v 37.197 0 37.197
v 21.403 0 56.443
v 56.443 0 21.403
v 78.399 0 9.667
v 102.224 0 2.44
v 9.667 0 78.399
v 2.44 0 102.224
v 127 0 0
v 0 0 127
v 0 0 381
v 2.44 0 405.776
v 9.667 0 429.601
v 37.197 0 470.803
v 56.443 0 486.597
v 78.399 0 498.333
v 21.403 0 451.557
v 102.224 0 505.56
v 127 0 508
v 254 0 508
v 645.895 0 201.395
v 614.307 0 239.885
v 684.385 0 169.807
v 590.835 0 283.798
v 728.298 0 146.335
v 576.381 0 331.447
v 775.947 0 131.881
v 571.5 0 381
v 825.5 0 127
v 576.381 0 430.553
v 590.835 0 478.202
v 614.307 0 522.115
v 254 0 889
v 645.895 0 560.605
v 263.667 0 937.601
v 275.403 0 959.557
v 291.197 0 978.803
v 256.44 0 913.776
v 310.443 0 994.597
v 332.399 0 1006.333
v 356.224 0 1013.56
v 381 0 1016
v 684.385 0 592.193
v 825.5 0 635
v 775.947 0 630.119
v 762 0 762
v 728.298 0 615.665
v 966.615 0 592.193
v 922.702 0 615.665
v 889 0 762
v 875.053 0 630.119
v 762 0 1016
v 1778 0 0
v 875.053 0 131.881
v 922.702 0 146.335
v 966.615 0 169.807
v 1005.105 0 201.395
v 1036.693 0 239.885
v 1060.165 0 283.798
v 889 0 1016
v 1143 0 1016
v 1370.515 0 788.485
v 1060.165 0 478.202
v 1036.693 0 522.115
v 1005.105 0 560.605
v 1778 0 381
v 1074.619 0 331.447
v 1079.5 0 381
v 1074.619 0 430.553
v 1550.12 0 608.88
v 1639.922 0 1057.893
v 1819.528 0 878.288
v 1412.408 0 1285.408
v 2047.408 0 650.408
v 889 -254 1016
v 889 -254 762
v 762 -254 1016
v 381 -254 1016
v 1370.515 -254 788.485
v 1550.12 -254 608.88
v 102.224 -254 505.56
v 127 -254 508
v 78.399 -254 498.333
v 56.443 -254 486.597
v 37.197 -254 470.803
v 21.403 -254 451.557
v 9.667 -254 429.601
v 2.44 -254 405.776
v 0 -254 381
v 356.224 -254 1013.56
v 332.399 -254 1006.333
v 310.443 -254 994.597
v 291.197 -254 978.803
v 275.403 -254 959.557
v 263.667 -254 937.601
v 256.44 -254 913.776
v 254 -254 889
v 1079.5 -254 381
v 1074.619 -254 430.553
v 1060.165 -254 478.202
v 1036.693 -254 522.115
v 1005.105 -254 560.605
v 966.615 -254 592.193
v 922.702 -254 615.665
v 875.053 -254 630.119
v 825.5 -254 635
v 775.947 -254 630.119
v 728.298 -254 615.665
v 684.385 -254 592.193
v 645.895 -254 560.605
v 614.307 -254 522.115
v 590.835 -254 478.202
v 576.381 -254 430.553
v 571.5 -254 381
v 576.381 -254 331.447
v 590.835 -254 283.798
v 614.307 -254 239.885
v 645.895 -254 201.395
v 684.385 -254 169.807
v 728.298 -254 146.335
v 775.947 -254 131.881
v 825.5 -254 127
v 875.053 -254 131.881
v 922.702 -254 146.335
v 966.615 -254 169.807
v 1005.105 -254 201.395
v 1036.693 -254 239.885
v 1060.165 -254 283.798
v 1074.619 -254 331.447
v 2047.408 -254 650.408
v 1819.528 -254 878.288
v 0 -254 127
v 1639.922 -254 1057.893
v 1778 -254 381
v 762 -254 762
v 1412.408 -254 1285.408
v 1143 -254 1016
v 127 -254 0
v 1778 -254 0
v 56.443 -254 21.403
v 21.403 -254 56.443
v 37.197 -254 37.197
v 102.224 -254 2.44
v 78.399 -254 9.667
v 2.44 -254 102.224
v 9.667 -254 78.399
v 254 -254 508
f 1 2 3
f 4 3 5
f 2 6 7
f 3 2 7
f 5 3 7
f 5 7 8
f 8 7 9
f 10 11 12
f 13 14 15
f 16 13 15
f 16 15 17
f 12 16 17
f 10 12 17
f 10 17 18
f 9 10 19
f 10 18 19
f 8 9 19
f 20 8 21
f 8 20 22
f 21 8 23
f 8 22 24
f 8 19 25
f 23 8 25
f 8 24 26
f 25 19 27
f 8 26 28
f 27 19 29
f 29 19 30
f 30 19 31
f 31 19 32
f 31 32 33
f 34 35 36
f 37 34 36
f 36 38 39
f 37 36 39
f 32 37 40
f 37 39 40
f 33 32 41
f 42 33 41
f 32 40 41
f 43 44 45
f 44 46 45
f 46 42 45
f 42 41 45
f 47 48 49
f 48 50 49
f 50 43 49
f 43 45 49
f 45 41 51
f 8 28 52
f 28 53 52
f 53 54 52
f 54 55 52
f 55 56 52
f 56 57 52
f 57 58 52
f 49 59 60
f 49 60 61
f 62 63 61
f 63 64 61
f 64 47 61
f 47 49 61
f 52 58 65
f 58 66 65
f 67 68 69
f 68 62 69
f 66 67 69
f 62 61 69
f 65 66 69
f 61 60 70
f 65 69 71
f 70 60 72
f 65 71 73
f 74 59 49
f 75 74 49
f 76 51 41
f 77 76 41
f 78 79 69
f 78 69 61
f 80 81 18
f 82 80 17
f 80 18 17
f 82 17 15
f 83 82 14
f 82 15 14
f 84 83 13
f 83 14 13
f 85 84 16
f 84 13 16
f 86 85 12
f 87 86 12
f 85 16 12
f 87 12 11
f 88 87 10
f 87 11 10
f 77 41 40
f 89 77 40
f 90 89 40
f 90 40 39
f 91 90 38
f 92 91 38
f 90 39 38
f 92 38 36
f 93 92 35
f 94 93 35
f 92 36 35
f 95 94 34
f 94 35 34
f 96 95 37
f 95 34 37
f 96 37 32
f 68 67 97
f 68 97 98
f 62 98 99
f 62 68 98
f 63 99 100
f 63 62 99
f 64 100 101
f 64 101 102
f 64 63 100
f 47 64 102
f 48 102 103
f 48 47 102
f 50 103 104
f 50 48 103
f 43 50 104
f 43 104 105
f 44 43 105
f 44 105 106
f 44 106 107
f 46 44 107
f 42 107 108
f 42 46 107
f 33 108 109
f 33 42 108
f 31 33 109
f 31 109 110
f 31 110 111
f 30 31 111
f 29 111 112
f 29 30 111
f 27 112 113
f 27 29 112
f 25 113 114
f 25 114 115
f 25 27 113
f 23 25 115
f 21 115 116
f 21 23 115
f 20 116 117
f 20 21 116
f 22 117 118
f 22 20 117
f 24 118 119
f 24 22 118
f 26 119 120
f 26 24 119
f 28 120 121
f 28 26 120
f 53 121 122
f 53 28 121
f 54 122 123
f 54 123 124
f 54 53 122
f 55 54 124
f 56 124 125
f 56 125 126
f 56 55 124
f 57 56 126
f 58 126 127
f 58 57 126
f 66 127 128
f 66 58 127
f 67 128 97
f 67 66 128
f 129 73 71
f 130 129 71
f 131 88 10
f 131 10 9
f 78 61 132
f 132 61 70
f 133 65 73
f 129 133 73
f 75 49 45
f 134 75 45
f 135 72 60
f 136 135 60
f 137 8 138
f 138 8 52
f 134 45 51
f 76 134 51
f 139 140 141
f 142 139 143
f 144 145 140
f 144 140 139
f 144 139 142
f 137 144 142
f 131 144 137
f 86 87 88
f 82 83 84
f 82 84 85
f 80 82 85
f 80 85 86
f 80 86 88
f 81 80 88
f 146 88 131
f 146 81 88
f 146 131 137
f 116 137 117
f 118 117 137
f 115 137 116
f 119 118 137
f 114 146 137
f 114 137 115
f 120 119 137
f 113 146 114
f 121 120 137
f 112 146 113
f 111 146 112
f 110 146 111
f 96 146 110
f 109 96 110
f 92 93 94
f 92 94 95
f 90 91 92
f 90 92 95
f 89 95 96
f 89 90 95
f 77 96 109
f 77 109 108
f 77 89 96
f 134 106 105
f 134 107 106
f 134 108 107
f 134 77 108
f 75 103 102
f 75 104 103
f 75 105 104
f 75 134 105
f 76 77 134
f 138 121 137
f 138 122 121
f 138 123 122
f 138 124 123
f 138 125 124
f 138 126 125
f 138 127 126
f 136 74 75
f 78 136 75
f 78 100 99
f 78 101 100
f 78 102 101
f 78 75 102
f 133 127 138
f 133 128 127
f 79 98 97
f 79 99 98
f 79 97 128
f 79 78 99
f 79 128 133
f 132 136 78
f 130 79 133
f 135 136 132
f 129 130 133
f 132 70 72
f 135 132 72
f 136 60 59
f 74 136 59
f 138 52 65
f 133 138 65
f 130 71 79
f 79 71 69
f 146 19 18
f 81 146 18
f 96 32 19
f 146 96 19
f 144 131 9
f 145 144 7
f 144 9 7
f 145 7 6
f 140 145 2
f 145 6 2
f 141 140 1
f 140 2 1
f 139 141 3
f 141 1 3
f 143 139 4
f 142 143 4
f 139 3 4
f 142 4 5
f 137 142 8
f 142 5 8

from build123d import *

# Parameters (mm, degrees)
F0_R     = 254
F1_DEPTH = 254


with BuildPart() as f1:
    # F0 (on Front) → F1 (new body)
    with BuildSketch(Plane.XZ):
        with BuildLine():
            Line((0, 381), (0, 127))
            ThreePointArc((0, 127), (37.197439, 37.197439), (127, 0))
            Line((127, 0), (1778, 0))
            Line((1778, 0), (1778, 381))
            Line((1778, 381), (2047.407684, 650.407684))
            Line((2047.407684, 650.407684), (1819.527595, 878.287772))
            Line((1819.527595, 878.287772), (1550.119911, 608.880089))
            Line((1550.119911, 608.880089), (1370.514789, 788.485211))
            Line((1370.514789, 788.485211), (1639.922472, 1057.892895))
            Line((1639.922472, 1057.892895), (1412.407684, 1285.407684))
            Line((1412.407684, 1285.407684), (1143, 1016))
            Line((1143, 1016), (889, 1016))
            Line((889, 1016), (889, 762))
            Line((889, 762), (762, 762))
            Line((762, 762), (762, 1016))
            Line((762, 1016), (381, 1016))
            ThreePointArc((381, 1016), (291.197439, 978.802561), (254, 889))
            Line((254, 889), (254, 508))
            Line((254, 508), (127, 508))
            ThreePointArc((127, 508), (37.197439, 470.802561), (0, 381))
        make_face()
        with Locations((825.5, 381)):
            Circle(F0_R, mode=Mode.SUBTRACT)
    extrude(amount=F1_DEPTH)


solid = f1.part
